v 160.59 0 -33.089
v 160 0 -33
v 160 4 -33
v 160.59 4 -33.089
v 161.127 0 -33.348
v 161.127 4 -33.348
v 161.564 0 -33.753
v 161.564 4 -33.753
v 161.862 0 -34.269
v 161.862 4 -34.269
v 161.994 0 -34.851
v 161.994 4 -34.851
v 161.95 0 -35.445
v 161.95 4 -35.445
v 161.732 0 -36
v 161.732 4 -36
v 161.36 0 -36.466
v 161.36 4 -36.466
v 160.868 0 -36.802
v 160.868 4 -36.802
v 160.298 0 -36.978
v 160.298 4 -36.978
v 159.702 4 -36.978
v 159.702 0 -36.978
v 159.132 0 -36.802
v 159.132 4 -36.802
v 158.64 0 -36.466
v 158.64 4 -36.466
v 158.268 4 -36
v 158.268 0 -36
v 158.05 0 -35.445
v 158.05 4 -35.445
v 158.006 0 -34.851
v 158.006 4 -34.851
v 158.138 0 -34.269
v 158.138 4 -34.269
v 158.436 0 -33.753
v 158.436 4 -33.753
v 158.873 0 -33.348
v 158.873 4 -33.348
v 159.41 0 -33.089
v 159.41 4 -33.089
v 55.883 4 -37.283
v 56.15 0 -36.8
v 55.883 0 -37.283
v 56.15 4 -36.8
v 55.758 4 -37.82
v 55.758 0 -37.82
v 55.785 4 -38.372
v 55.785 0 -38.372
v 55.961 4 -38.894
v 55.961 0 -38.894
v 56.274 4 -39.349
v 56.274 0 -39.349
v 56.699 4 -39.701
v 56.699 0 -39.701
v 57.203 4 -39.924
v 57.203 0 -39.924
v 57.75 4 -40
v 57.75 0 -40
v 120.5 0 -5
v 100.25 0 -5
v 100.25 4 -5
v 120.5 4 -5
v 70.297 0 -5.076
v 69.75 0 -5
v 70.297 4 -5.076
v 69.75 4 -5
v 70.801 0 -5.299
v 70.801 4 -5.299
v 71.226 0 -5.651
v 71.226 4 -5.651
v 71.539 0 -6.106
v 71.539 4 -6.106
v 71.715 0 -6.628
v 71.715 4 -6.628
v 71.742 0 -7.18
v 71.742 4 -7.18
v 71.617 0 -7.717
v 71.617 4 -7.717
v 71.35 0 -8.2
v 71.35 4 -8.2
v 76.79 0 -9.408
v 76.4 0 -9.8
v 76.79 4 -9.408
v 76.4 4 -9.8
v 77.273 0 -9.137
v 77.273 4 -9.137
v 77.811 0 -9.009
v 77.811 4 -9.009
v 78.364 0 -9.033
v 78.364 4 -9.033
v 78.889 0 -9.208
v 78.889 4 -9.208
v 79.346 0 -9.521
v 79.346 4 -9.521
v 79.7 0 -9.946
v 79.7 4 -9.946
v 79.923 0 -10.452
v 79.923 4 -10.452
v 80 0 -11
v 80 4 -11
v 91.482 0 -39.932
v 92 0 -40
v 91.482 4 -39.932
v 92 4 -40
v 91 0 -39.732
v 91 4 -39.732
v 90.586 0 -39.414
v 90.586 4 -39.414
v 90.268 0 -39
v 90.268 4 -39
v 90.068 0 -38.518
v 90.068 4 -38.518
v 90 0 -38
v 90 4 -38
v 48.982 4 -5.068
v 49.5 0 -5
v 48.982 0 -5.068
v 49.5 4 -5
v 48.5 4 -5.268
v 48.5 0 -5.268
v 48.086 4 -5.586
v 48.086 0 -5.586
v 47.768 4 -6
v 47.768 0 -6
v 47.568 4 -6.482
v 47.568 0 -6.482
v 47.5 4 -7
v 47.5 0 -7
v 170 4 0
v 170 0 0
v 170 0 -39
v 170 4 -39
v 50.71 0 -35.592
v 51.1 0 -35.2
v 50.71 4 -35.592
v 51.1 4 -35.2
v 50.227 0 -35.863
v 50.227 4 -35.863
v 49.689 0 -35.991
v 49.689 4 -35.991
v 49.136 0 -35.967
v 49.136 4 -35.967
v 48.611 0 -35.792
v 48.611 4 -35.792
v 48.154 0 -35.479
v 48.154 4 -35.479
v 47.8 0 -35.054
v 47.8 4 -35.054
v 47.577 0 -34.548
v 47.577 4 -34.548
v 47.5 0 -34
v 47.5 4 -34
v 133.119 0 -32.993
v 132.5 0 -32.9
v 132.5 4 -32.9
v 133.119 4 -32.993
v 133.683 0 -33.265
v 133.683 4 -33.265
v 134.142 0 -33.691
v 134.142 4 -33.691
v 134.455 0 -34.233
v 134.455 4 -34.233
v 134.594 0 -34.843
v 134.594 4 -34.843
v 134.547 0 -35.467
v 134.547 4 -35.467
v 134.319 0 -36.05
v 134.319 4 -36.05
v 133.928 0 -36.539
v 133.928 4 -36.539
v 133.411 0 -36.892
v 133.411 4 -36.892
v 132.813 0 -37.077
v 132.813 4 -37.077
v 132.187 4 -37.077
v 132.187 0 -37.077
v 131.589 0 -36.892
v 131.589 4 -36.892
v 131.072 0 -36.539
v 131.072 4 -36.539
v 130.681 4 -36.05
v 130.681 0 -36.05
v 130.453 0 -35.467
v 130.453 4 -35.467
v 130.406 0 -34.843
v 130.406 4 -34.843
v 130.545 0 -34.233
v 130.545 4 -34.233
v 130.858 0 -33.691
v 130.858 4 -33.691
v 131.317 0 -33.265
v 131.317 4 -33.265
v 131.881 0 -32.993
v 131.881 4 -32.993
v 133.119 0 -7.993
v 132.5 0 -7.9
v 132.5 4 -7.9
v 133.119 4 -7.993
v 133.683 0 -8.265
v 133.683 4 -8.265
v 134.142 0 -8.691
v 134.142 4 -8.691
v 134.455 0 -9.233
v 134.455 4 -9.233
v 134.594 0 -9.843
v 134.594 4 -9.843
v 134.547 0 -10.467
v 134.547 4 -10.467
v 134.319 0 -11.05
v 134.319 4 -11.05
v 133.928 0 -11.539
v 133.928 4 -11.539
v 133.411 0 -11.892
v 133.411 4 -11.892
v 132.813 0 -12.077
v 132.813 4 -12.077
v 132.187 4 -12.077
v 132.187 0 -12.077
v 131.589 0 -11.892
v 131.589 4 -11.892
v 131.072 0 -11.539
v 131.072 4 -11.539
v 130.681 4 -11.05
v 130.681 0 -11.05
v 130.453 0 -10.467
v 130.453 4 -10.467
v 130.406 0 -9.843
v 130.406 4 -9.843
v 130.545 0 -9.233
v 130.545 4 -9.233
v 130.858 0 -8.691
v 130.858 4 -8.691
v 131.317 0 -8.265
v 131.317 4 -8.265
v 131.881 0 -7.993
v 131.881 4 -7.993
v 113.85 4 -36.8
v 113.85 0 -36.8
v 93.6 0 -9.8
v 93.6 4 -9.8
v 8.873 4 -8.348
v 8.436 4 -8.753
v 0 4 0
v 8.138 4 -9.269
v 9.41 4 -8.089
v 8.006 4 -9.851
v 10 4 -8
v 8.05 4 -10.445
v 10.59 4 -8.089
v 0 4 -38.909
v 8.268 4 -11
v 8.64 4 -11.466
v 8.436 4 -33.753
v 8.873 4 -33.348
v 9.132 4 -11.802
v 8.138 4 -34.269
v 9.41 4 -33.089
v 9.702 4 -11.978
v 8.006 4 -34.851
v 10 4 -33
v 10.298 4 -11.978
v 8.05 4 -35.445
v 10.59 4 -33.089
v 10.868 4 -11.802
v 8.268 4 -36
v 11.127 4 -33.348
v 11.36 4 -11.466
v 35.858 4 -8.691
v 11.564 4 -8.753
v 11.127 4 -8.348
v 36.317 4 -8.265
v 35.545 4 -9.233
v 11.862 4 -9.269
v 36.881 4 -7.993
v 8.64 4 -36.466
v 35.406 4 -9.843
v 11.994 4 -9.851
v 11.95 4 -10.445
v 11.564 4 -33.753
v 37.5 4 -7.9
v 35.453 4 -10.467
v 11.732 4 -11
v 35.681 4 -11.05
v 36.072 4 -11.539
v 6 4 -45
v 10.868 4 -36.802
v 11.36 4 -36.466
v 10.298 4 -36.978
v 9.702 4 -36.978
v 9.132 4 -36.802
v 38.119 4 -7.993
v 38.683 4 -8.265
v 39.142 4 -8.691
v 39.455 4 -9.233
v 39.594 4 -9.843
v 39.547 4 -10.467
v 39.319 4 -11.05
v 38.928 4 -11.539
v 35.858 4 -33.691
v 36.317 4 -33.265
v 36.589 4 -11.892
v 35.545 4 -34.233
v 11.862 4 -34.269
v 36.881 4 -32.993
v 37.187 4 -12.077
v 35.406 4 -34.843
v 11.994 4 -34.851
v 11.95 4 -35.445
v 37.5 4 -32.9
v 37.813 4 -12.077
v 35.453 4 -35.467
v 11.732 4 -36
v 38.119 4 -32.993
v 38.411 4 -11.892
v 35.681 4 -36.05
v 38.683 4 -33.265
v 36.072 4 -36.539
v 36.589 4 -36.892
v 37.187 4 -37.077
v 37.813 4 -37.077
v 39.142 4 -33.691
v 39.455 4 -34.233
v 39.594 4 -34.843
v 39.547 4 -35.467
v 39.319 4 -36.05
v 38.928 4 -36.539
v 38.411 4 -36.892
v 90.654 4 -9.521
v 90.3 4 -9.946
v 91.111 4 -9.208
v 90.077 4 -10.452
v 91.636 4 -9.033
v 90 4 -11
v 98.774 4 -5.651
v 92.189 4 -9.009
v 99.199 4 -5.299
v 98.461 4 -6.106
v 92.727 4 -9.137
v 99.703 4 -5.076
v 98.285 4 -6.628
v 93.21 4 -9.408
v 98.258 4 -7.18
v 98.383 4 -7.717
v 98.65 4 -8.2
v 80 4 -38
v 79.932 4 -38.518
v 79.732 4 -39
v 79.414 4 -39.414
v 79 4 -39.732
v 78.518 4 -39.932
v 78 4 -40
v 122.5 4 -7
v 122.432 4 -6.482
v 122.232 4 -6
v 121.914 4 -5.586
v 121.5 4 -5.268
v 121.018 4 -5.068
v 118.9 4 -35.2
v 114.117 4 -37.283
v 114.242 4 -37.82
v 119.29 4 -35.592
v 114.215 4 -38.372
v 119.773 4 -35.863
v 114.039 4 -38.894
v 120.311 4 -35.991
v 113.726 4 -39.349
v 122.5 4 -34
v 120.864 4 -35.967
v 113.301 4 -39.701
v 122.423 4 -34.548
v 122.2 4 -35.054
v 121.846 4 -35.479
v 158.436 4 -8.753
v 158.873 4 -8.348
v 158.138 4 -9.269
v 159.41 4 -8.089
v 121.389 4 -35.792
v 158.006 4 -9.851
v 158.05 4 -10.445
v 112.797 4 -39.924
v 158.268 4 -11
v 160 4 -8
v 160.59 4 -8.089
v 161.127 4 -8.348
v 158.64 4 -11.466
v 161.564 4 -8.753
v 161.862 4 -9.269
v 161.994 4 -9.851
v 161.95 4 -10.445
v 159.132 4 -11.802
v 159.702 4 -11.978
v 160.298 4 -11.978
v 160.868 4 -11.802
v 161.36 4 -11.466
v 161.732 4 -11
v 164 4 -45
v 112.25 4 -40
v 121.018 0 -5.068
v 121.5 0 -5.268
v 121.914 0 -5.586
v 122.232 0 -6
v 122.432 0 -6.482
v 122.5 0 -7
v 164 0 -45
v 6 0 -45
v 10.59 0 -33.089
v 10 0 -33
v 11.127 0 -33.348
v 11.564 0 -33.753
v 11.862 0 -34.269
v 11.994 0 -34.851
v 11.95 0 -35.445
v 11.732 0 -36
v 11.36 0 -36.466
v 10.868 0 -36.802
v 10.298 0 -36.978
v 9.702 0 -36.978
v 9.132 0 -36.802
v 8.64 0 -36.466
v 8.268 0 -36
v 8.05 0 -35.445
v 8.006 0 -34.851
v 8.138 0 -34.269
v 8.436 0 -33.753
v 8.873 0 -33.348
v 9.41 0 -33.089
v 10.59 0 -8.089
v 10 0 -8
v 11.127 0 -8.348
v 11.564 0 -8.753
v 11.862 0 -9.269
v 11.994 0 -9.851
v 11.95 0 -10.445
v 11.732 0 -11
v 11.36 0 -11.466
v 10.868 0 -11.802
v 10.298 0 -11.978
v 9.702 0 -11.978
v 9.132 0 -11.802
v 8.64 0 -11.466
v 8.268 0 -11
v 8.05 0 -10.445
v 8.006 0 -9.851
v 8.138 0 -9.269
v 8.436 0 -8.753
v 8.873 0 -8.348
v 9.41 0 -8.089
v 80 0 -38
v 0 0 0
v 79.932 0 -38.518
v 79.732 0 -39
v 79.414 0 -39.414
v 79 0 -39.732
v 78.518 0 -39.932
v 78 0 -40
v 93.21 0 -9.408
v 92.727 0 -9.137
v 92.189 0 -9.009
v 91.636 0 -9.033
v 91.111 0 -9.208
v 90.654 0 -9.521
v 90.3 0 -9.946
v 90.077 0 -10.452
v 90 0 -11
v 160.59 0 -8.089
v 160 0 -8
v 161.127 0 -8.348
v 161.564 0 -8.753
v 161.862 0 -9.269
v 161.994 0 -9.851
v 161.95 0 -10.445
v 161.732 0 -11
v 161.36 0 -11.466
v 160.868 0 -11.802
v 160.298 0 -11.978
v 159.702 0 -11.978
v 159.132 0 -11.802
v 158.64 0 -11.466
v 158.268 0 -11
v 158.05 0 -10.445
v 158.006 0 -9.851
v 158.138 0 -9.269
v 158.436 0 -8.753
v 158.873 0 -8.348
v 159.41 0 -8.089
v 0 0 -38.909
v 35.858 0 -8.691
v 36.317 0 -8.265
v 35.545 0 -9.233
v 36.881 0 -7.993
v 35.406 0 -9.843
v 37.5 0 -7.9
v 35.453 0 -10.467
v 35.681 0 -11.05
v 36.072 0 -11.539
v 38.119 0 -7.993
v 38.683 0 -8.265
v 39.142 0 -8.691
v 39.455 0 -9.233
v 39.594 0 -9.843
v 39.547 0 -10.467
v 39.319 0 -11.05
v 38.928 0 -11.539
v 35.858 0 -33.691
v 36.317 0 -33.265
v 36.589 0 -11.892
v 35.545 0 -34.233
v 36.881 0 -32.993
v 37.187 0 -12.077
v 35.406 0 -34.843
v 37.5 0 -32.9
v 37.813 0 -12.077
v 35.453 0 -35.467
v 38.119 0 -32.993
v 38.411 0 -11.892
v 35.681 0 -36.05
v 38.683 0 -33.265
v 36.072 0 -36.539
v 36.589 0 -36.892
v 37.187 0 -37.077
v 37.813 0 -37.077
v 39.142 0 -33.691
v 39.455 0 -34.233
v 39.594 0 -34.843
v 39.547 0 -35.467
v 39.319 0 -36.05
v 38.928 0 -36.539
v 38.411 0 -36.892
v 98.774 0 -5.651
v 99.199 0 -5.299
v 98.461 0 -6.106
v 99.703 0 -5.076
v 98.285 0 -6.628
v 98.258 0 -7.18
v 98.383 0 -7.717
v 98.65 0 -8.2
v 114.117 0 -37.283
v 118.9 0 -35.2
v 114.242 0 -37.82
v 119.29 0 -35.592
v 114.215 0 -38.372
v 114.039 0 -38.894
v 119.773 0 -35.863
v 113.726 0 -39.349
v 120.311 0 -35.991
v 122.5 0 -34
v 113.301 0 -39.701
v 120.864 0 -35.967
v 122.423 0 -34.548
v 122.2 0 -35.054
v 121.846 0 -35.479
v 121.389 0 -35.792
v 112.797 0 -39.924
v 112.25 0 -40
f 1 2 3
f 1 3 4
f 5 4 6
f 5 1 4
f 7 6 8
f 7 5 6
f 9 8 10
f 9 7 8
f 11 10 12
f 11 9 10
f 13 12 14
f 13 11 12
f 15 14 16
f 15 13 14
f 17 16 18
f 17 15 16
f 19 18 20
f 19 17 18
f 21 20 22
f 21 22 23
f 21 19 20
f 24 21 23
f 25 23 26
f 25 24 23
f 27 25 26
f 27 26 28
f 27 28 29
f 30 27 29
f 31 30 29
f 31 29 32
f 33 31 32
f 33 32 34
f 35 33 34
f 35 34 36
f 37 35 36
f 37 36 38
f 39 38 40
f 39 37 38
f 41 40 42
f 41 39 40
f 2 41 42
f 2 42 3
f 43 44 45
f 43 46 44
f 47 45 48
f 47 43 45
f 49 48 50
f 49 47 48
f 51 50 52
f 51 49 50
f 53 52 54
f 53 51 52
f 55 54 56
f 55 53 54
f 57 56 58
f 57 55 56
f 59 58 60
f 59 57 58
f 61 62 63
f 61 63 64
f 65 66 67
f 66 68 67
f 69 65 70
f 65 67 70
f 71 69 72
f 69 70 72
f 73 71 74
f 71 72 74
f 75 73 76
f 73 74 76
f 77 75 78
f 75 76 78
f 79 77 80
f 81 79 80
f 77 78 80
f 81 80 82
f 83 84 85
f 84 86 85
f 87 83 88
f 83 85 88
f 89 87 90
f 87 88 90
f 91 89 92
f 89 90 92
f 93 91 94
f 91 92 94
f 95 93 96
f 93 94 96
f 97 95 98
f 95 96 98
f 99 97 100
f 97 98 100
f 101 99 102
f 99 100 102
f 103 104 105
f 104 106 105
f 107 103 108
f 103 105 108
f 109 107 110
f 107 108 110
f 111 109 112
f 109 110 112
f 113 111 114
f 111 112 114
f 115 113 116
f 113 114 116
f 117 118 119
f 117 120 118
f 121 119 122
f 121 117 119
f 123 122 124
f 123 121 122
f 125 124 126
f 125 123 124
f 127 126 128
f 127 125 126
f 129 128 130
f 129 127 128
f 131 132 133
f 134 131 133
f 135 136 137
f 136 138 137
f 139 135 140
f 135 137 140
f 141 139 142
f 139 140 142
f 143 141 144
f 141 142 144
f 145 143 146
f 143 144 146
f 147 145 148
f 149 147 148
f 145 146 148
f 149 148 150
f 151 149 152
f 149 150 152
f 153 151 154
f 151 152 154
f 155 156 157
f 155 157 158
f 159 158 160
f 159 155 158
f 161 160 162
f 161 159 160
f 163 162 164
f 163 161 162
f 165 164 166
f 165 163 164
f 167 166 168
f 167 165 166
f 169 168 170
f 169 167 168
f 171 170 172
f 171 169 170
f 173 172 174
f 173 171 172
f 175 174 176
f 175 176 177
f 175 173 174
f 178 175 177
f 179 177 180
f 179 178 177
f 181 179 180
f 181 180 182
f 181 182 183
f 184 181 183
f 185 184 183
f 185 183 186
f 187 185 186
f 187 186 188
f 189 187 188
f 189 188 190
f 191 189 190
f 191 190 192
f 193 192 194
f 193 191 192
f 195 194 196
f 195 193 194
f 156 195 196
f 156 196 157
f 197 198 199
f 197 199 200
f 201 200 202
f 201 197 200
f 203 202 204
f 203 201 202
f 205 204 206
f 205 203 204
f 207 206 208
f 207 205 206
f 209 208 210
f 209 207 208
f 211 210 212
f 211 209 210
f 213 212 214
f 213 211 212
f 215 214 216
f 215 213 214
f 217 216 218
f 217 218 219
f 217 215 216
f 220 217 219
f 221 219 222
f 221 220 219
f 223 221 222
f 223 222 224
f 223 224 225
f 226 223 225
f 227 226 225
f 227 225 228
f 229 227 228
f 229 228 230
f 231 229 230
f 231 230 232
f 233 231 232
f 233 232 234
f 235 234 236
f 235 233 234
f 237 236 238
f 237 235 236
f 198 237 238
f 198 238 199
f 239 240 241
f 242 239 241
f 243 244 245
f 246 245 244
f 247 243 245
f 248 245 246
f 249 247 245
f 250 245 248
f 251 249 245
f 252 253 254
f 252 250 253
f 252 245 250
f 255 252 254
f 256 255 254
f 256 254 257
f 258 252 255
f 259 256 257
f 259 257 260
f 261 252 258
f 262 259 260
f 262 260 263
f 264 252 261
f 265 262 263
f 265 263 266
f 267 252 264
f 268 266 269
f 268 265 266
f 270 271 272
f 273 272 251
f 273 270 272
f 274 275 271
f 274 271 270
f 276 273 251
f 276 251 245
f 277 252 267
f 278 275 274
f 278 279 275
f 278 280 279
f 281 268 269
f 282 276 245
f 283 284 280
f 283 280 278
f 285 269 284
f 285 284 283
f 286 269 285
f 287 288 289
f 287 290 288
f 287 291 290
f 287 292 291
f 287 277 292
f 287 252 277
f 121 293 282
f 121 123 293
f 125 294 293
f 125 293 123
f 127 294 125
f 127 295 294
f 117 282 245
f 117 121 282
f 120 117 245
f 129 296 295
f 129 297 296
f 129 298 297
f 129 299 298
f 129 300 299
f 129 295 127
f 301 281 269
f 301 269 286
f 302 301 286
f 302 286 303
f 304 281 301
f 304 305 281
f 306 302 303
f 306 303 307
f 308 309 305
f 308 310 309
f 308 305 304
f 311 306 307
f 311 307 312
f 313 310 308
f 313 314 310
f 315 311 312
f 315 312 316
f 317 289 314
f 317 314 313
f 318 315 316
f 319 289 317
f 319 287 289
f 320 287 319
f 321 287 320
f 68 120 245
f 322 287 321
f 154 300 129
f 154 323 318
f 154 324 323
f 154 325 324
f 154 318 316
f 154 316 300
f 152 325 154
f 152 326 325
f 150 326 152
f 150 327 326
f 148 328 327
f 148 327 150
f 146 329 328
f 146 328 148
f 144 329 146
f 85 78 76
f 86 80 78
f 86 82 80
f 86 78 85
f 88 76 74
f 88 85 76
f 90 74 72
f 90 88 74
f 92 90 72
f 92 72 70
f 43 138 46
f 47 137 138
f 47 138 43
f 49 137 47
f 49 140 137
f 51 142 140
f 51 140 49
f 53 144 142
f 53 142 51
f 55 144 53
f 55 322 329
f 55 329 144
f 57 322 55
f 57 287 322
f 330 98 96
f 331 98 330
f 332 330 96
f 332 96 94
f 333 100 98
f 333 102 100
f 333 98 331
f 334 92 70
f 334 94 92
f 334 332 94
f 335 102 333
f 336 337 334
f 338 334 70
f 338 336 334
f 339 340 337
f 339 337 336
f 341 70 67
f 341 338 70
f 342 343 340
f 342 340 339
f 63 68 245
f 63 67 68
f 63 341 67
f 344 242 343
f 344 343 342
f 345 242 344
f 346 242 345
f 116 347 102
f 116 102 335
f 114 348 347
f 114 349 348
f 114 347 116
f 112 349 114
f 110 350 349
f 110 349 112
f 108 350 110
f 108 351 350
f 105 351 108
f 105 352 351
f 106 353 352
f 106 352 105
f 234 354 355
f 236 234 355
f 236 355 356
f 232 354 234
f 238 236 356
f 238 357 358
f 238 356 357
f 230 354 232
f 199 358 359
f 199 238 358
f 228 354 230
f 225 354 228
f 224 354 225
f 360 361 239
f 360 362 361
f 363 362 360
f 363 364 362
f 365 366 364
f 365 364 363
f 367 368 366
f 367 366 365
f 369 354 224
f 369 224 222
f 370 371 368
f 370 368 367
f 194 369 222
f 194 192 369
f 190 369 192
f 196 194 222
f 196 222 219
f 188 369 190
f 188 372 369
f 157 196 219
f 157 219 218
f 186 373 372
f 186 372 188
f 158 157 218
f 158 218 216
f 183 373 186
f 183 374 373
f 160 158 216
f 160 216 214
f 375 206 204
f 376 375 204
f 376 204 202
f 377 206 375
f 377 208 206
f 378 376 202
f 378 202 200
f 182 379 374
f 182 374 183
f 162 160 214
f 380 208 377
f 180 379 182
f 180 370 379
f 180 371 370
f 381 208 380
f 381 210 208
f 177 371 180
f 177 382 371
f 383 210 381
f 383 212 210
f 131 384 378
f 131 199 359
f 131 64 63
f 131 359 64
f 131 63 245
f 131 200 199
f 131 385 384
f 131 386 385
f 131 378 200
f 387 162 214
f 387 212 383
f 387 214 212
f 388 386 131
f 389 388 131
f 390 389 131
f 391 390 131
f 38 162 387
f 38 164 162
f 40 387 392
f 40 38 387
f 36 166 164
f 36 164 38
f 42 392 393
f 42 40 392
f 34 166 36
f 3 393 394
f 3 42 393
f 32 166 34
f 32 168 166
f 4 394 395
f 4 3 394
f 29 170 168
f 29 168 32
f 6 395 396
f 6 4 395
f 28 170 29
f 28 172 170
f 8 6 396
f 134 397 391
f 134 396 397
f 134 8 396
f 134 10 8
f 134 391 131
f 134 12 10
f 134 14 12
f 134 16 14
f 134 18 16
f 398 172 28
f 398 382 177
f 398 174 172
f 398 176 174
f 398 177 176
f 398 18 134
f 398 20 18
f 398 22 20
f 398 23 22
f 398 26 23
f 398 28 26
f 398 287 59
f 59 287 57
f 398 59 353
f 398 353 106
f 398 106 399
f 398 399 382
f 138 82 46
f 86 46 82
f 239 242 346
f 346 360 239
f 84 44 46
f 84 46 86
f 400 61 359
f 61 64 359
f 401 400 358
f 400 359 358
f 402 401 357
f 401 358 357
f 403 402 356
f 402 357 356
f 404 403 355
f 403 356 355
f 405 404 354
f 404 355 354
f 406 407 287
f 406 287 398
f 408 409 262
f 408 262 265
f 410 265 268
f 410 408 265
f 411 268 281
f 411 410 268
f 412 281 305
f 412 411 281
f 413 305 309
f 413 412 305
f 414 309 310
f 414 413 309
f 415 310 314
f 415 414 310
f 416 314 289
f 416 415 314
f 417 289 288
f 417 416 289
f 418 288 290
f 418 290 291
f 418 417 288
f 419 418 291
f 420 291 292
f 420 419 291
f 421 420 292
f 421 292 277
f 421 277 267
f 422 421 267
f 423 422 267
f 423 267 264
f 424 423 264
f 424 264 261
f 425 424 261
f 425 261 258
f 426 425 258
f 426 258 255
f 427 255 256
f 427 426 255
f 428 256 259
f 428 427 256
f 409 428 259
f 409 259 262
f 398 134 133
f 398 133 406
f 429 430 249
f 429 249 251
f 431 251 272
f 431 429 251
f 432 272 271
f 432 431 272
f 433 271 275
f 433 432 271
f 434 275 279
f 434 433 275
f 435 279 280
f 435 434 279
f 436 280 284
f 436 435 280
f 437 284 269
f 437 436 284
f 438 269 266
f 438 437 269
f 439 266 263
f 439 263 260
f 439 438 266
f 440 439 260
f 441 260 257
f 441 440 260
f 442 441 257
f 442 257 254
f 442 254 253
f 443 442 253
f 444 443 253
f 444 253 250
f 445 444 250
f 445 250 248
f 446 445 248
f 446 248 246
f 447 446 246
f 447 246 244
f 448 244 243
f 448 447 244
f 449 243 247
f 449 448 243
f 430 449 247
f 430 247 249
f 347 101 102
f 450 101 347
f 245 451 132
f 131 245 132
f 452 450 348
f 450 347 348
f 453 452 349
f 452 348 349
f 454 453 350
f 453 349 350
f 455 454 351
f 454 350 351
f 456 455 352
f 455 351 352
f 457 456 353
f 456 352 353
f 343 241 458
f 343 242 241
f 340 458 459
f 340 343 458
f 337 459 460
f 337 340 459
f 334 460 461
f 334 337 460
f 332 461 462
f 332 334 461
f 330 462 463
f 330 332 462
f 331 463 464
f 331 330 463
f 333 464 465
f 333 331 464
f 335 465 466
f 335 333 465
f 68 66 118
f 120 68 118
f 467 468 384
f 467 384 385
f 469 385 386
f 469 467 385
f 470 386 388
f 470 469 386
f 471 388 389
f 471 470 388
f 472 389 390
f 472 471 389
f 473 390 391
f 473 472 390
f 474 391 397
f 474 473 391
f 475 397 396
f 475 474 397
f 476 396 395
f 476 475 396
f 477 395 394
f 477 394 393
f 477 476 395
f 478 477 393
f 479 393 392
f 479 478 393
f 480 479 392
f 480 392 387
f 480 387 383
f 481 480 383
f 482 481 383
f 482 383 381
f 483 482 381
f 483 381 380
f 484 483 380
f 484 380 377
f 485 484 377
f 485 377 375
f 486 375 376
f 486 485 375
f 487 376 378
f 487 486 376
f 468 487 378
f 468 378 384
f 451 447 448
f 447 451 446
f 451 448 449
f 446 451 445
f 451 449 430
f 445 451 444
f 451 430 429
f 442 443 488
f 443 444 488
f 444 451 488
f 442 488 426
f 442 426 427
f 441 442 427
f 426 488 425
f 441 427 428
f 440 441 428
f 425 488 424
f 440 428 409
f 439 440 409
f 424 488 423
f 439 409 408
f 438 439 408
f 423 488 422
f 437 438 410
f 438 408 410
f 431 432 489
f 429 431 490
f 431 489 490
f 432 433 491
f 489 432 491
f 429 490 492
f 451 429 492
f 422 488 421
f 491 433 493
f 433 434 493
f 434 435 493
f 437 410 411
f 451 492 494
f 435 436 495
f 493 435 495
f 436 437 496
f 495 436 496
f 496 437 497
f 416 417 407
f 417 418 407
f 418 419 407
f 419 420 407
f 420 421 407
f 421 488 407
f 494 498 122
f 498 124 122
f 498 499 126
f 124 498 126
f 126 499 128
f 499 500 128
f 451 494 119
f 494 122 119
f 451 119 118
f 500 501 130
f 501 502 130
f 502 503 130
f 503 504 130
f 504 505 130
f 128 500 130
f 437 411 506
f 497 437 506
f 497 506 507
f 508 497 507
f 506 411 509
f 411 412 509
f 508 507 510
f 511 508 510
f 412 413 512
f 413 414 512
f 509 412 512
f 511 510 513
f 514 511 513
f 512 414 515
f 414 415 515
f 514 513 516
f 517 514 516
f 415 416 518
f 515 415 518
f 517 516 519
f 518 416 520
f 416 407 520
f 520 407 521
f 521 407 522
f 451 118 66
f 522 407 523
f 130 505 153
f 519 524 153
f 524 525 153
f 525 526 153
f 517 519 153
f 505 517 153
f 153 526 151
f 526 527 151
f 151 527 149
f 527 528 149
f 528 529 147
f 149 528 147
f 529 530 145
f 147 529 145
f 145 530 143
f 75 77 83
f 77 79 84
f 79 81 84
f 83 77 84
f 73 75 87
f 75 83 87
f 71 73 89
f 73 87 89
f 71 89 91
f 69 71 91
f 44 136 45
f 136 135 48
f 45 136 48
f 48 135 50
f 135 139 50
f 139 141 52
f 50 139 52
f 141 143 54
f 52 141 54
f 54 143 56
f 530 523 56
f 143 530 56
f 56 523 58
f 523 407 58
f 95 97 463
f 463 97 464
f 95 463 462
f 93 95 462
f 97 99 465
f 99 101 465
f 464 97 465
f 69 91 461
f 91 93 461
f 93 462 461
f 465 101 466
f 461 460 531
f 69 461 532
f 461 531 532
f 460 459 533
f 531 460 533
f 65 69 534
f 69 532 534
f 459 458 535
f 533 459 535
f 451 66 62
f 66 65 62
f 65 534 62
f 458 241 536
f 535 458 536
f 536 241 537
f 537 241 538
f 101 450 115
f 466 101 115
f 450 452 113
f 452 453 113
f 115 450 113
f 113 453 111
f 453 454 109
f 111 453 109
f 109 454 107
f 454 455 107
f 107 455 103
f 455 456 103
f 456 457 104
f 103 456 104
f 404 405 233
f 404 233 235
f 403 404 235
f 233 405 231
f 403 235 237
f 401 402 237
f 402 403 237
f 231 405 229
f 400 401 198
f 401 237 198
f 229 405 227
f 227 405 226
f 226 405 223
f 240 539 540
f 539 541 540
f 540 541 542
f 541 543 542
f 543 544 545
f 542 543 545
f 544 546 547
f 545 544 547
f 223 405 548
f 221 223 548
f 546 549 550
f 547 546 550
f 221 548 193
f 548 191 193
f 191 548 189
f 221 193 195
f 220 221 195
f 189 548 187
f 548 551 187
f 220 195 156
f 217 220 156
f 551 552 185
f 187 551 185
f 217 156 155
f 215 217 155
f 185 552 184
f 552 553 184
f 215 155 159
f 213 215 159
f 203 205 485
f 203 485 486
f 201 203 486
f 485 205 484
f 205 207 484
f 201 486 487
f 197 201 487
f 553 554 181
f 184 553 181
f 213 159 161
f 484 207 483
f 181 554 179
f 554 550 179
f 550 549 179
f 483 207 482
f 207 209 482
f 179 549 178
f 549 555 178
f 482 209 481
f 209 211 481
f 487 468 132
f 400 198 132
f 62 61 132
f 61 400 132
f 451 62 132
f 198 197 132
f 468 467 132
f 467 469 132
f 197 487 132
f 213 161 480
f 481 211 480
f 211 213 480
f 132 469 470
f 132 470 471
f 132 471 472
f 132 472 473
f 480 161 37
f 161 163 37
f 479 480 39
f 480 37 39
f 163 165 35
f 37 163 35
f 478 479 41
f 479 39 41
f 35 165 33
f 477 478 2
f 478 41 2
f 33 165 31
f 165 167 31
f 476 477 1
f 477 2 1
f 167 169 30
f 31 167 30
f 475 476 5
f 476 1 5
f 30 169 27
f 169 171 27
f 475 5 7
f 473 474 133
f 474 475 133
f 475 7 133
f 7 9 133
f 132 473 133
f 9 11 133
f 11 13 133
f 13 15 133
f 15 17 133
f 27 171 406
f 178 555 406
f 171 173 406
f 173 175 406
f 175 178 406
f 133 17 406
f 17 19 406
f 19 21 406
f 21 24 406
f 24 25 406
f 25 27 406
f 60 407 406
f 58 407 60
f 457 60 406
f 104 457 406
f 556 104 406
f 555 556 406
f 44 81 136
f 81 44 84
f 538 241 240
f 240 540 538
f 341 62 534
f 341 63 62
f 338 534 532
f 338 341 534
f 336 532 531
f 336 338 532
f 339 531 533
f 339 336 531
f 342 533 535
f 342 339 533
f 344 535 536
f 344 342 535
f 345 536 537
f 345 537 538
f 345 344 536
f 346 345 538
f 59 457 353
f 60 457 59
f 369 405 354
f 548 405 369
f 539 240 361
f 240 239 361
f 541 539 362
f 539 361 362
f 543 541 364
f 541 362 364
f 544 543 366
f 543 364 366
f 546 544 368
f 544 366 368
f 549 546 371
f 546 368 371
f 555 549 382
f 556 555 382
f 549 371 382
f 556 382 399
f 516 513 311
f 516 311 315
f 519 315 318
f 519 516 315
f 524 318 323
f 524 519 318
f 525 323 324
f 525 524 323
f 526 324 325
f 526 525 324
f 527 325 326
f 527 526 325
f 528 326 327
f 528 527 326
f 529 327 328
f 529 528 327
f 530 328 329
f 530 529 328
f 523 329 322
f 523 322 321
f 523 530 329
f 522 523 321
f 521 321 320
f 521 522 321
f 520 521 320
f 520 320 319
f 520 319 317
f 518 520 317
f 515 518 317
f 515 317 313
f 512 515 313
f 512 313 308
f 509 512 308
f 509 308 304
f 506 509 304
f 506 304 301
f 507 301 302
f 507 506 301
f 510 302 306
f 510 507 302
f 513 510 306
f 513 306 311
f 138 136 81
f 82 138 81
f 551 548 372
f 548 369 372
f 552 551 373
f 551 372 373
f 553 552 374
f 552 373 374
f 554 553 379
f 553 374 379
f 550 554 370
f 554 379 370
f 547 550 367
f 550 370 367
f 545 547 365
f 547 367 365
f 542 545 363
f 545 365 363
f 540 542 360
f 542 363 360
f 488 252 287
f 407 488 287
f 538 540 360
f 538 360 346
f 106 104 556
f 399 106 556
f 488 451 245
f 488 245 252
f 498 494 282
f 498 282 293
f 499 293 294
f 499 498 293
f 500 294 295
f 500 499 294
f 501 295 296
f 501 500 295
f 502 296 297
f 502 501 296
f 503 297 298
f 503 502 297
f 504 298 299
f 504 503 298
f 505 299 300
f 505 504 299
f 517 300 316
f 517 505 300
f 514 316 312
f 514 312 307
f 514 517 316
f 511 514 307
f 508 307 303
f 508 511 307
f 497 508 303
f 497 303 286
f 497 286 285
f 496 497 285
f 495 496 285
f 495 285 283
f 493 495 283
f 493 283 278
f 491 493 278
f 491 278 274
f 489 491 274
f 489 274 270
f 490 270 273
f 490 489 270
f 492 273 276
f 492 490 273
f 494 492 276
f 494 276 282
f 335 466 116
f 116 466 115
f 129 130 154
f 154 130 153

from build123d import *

# Parameters (mm, degrees)
SKETCH_1_W          = 170
SKETCH_1_H          = 45
SKETCH_1_R          = 2
SKETCH_1_R_2        = 2.1
EXTRUDE_1_DEPTH     = 4
CUT_EXTRUDE_1_DEPTH = 4
CUT_EXTRUDE_2_DEPTH = 4
FILLET_1_R          = 2


with BuildPart() as part:
    # 草图1 → 凸台-拉伸1 (new body)
    with BuildSketch(Plane(origin=(0, 0, 0), x_dir=(1, 0, 0), z_dir=(0, 1, 0))):
        with Locations((85, 22.5)):
            Rectangle(SKETCH_1_W, SKETCH_1_H)
        with Locations(Location((10, 35, 0), (0, 0, 270))):
            Circle(SKETCH_1_R, mode=Mode.SUBTRACT)
        with Locations(Location((10, 10, 0), (0, 0, 270))):
            Circle(SKETCH_1_R, mode=Mode.SUBTRACT)
        with Locations(Location((160, 10, 0), (0, 0, 270))):
            Circle(SKETCH_1_R, mode=Mode.SUBTRACT)
        with Locations(Location((160, 35, 0), (0, 0, 270))):
            Circle(SKETCH_1_R, mode=Mode.SUBTRACT)
        with Locations(Location((37.5, 35, 0), (0, 0, 270))):
            Circle(SKETCH_1_R_2, mode=Mode.SUBTRACT)
        with Locations(Location((37.5, 10, 0), (0, 0, 270))):
            Circle(SKETCH_1_R_2, mode=Mode.SUBTRACT)
        with Locations(Location((132.5, 10, 0), (0, 0, 270))):
            Circle(SKETCH_1_R_2, mode=Mode.SUBTRACT)
        with Locations(Location((132.5, 35, 0), (0, 0, 270))):
            Circle(SKETCH_1_R_2, mode=Mode.SUBTRACT)
    extrude(amount=EXTRUDE_1_DEPTH)

    # 草图4 → 切除-拉伸1 (cut)
    with BuildSketch(Plane(origin=(0, 4, 0), x_dir=(1, 0, 0), z_dir=(0, 1, 0))):
        Polygon((0, 38.909451479), (6, 45), (0, 45), align=None)
        Polygon((170, 39), (164, 45), (170, 45), align=None)
    extrude(amount=-CUT_EXTRUDE_1_DEPTH, mode=Mode.SUBTRACT)

    # 草图5 → 切除-拉伸2 (cut)
    with BuildSketch(Plane.XZ):
        Polygon((47.5, -5), (47.5, -40), (73.75, -5), align=None)
        Polygon((53.75, -40), (80, -5), (80, -40), align=None)
        Polygon((90, -5), (90, -40), (116.25, -40), align=None)
        Polygon((96.25, -5), (122.5, -5), (122.5, -40), align=None)
    extrude(amount=-CUT_EXTRUDE_2_DEPTH, mode=Mode.SUBTRACT)

    # 圆角1
    fillet_1_edges = [part.edges().sort_by_distance(p)[0] for p in [
        (80, 2, -5),
        (53.75, 2, -40),
        (80, 2, -40),
        (90, 2, -40),
        (116.25, 2, -40),
        (90, 2, -5),
        (122.5, 2, -5),
        (96.25, 2, -5),
        (122.5, 2, -40),
        (47.5, 2, -40),
        (73.75, 2, -5),
        (47.5, 2, -5),
    ]]
    fillet(fillet_1_edges, radius=FILLET_1_R)


solid = part.part
